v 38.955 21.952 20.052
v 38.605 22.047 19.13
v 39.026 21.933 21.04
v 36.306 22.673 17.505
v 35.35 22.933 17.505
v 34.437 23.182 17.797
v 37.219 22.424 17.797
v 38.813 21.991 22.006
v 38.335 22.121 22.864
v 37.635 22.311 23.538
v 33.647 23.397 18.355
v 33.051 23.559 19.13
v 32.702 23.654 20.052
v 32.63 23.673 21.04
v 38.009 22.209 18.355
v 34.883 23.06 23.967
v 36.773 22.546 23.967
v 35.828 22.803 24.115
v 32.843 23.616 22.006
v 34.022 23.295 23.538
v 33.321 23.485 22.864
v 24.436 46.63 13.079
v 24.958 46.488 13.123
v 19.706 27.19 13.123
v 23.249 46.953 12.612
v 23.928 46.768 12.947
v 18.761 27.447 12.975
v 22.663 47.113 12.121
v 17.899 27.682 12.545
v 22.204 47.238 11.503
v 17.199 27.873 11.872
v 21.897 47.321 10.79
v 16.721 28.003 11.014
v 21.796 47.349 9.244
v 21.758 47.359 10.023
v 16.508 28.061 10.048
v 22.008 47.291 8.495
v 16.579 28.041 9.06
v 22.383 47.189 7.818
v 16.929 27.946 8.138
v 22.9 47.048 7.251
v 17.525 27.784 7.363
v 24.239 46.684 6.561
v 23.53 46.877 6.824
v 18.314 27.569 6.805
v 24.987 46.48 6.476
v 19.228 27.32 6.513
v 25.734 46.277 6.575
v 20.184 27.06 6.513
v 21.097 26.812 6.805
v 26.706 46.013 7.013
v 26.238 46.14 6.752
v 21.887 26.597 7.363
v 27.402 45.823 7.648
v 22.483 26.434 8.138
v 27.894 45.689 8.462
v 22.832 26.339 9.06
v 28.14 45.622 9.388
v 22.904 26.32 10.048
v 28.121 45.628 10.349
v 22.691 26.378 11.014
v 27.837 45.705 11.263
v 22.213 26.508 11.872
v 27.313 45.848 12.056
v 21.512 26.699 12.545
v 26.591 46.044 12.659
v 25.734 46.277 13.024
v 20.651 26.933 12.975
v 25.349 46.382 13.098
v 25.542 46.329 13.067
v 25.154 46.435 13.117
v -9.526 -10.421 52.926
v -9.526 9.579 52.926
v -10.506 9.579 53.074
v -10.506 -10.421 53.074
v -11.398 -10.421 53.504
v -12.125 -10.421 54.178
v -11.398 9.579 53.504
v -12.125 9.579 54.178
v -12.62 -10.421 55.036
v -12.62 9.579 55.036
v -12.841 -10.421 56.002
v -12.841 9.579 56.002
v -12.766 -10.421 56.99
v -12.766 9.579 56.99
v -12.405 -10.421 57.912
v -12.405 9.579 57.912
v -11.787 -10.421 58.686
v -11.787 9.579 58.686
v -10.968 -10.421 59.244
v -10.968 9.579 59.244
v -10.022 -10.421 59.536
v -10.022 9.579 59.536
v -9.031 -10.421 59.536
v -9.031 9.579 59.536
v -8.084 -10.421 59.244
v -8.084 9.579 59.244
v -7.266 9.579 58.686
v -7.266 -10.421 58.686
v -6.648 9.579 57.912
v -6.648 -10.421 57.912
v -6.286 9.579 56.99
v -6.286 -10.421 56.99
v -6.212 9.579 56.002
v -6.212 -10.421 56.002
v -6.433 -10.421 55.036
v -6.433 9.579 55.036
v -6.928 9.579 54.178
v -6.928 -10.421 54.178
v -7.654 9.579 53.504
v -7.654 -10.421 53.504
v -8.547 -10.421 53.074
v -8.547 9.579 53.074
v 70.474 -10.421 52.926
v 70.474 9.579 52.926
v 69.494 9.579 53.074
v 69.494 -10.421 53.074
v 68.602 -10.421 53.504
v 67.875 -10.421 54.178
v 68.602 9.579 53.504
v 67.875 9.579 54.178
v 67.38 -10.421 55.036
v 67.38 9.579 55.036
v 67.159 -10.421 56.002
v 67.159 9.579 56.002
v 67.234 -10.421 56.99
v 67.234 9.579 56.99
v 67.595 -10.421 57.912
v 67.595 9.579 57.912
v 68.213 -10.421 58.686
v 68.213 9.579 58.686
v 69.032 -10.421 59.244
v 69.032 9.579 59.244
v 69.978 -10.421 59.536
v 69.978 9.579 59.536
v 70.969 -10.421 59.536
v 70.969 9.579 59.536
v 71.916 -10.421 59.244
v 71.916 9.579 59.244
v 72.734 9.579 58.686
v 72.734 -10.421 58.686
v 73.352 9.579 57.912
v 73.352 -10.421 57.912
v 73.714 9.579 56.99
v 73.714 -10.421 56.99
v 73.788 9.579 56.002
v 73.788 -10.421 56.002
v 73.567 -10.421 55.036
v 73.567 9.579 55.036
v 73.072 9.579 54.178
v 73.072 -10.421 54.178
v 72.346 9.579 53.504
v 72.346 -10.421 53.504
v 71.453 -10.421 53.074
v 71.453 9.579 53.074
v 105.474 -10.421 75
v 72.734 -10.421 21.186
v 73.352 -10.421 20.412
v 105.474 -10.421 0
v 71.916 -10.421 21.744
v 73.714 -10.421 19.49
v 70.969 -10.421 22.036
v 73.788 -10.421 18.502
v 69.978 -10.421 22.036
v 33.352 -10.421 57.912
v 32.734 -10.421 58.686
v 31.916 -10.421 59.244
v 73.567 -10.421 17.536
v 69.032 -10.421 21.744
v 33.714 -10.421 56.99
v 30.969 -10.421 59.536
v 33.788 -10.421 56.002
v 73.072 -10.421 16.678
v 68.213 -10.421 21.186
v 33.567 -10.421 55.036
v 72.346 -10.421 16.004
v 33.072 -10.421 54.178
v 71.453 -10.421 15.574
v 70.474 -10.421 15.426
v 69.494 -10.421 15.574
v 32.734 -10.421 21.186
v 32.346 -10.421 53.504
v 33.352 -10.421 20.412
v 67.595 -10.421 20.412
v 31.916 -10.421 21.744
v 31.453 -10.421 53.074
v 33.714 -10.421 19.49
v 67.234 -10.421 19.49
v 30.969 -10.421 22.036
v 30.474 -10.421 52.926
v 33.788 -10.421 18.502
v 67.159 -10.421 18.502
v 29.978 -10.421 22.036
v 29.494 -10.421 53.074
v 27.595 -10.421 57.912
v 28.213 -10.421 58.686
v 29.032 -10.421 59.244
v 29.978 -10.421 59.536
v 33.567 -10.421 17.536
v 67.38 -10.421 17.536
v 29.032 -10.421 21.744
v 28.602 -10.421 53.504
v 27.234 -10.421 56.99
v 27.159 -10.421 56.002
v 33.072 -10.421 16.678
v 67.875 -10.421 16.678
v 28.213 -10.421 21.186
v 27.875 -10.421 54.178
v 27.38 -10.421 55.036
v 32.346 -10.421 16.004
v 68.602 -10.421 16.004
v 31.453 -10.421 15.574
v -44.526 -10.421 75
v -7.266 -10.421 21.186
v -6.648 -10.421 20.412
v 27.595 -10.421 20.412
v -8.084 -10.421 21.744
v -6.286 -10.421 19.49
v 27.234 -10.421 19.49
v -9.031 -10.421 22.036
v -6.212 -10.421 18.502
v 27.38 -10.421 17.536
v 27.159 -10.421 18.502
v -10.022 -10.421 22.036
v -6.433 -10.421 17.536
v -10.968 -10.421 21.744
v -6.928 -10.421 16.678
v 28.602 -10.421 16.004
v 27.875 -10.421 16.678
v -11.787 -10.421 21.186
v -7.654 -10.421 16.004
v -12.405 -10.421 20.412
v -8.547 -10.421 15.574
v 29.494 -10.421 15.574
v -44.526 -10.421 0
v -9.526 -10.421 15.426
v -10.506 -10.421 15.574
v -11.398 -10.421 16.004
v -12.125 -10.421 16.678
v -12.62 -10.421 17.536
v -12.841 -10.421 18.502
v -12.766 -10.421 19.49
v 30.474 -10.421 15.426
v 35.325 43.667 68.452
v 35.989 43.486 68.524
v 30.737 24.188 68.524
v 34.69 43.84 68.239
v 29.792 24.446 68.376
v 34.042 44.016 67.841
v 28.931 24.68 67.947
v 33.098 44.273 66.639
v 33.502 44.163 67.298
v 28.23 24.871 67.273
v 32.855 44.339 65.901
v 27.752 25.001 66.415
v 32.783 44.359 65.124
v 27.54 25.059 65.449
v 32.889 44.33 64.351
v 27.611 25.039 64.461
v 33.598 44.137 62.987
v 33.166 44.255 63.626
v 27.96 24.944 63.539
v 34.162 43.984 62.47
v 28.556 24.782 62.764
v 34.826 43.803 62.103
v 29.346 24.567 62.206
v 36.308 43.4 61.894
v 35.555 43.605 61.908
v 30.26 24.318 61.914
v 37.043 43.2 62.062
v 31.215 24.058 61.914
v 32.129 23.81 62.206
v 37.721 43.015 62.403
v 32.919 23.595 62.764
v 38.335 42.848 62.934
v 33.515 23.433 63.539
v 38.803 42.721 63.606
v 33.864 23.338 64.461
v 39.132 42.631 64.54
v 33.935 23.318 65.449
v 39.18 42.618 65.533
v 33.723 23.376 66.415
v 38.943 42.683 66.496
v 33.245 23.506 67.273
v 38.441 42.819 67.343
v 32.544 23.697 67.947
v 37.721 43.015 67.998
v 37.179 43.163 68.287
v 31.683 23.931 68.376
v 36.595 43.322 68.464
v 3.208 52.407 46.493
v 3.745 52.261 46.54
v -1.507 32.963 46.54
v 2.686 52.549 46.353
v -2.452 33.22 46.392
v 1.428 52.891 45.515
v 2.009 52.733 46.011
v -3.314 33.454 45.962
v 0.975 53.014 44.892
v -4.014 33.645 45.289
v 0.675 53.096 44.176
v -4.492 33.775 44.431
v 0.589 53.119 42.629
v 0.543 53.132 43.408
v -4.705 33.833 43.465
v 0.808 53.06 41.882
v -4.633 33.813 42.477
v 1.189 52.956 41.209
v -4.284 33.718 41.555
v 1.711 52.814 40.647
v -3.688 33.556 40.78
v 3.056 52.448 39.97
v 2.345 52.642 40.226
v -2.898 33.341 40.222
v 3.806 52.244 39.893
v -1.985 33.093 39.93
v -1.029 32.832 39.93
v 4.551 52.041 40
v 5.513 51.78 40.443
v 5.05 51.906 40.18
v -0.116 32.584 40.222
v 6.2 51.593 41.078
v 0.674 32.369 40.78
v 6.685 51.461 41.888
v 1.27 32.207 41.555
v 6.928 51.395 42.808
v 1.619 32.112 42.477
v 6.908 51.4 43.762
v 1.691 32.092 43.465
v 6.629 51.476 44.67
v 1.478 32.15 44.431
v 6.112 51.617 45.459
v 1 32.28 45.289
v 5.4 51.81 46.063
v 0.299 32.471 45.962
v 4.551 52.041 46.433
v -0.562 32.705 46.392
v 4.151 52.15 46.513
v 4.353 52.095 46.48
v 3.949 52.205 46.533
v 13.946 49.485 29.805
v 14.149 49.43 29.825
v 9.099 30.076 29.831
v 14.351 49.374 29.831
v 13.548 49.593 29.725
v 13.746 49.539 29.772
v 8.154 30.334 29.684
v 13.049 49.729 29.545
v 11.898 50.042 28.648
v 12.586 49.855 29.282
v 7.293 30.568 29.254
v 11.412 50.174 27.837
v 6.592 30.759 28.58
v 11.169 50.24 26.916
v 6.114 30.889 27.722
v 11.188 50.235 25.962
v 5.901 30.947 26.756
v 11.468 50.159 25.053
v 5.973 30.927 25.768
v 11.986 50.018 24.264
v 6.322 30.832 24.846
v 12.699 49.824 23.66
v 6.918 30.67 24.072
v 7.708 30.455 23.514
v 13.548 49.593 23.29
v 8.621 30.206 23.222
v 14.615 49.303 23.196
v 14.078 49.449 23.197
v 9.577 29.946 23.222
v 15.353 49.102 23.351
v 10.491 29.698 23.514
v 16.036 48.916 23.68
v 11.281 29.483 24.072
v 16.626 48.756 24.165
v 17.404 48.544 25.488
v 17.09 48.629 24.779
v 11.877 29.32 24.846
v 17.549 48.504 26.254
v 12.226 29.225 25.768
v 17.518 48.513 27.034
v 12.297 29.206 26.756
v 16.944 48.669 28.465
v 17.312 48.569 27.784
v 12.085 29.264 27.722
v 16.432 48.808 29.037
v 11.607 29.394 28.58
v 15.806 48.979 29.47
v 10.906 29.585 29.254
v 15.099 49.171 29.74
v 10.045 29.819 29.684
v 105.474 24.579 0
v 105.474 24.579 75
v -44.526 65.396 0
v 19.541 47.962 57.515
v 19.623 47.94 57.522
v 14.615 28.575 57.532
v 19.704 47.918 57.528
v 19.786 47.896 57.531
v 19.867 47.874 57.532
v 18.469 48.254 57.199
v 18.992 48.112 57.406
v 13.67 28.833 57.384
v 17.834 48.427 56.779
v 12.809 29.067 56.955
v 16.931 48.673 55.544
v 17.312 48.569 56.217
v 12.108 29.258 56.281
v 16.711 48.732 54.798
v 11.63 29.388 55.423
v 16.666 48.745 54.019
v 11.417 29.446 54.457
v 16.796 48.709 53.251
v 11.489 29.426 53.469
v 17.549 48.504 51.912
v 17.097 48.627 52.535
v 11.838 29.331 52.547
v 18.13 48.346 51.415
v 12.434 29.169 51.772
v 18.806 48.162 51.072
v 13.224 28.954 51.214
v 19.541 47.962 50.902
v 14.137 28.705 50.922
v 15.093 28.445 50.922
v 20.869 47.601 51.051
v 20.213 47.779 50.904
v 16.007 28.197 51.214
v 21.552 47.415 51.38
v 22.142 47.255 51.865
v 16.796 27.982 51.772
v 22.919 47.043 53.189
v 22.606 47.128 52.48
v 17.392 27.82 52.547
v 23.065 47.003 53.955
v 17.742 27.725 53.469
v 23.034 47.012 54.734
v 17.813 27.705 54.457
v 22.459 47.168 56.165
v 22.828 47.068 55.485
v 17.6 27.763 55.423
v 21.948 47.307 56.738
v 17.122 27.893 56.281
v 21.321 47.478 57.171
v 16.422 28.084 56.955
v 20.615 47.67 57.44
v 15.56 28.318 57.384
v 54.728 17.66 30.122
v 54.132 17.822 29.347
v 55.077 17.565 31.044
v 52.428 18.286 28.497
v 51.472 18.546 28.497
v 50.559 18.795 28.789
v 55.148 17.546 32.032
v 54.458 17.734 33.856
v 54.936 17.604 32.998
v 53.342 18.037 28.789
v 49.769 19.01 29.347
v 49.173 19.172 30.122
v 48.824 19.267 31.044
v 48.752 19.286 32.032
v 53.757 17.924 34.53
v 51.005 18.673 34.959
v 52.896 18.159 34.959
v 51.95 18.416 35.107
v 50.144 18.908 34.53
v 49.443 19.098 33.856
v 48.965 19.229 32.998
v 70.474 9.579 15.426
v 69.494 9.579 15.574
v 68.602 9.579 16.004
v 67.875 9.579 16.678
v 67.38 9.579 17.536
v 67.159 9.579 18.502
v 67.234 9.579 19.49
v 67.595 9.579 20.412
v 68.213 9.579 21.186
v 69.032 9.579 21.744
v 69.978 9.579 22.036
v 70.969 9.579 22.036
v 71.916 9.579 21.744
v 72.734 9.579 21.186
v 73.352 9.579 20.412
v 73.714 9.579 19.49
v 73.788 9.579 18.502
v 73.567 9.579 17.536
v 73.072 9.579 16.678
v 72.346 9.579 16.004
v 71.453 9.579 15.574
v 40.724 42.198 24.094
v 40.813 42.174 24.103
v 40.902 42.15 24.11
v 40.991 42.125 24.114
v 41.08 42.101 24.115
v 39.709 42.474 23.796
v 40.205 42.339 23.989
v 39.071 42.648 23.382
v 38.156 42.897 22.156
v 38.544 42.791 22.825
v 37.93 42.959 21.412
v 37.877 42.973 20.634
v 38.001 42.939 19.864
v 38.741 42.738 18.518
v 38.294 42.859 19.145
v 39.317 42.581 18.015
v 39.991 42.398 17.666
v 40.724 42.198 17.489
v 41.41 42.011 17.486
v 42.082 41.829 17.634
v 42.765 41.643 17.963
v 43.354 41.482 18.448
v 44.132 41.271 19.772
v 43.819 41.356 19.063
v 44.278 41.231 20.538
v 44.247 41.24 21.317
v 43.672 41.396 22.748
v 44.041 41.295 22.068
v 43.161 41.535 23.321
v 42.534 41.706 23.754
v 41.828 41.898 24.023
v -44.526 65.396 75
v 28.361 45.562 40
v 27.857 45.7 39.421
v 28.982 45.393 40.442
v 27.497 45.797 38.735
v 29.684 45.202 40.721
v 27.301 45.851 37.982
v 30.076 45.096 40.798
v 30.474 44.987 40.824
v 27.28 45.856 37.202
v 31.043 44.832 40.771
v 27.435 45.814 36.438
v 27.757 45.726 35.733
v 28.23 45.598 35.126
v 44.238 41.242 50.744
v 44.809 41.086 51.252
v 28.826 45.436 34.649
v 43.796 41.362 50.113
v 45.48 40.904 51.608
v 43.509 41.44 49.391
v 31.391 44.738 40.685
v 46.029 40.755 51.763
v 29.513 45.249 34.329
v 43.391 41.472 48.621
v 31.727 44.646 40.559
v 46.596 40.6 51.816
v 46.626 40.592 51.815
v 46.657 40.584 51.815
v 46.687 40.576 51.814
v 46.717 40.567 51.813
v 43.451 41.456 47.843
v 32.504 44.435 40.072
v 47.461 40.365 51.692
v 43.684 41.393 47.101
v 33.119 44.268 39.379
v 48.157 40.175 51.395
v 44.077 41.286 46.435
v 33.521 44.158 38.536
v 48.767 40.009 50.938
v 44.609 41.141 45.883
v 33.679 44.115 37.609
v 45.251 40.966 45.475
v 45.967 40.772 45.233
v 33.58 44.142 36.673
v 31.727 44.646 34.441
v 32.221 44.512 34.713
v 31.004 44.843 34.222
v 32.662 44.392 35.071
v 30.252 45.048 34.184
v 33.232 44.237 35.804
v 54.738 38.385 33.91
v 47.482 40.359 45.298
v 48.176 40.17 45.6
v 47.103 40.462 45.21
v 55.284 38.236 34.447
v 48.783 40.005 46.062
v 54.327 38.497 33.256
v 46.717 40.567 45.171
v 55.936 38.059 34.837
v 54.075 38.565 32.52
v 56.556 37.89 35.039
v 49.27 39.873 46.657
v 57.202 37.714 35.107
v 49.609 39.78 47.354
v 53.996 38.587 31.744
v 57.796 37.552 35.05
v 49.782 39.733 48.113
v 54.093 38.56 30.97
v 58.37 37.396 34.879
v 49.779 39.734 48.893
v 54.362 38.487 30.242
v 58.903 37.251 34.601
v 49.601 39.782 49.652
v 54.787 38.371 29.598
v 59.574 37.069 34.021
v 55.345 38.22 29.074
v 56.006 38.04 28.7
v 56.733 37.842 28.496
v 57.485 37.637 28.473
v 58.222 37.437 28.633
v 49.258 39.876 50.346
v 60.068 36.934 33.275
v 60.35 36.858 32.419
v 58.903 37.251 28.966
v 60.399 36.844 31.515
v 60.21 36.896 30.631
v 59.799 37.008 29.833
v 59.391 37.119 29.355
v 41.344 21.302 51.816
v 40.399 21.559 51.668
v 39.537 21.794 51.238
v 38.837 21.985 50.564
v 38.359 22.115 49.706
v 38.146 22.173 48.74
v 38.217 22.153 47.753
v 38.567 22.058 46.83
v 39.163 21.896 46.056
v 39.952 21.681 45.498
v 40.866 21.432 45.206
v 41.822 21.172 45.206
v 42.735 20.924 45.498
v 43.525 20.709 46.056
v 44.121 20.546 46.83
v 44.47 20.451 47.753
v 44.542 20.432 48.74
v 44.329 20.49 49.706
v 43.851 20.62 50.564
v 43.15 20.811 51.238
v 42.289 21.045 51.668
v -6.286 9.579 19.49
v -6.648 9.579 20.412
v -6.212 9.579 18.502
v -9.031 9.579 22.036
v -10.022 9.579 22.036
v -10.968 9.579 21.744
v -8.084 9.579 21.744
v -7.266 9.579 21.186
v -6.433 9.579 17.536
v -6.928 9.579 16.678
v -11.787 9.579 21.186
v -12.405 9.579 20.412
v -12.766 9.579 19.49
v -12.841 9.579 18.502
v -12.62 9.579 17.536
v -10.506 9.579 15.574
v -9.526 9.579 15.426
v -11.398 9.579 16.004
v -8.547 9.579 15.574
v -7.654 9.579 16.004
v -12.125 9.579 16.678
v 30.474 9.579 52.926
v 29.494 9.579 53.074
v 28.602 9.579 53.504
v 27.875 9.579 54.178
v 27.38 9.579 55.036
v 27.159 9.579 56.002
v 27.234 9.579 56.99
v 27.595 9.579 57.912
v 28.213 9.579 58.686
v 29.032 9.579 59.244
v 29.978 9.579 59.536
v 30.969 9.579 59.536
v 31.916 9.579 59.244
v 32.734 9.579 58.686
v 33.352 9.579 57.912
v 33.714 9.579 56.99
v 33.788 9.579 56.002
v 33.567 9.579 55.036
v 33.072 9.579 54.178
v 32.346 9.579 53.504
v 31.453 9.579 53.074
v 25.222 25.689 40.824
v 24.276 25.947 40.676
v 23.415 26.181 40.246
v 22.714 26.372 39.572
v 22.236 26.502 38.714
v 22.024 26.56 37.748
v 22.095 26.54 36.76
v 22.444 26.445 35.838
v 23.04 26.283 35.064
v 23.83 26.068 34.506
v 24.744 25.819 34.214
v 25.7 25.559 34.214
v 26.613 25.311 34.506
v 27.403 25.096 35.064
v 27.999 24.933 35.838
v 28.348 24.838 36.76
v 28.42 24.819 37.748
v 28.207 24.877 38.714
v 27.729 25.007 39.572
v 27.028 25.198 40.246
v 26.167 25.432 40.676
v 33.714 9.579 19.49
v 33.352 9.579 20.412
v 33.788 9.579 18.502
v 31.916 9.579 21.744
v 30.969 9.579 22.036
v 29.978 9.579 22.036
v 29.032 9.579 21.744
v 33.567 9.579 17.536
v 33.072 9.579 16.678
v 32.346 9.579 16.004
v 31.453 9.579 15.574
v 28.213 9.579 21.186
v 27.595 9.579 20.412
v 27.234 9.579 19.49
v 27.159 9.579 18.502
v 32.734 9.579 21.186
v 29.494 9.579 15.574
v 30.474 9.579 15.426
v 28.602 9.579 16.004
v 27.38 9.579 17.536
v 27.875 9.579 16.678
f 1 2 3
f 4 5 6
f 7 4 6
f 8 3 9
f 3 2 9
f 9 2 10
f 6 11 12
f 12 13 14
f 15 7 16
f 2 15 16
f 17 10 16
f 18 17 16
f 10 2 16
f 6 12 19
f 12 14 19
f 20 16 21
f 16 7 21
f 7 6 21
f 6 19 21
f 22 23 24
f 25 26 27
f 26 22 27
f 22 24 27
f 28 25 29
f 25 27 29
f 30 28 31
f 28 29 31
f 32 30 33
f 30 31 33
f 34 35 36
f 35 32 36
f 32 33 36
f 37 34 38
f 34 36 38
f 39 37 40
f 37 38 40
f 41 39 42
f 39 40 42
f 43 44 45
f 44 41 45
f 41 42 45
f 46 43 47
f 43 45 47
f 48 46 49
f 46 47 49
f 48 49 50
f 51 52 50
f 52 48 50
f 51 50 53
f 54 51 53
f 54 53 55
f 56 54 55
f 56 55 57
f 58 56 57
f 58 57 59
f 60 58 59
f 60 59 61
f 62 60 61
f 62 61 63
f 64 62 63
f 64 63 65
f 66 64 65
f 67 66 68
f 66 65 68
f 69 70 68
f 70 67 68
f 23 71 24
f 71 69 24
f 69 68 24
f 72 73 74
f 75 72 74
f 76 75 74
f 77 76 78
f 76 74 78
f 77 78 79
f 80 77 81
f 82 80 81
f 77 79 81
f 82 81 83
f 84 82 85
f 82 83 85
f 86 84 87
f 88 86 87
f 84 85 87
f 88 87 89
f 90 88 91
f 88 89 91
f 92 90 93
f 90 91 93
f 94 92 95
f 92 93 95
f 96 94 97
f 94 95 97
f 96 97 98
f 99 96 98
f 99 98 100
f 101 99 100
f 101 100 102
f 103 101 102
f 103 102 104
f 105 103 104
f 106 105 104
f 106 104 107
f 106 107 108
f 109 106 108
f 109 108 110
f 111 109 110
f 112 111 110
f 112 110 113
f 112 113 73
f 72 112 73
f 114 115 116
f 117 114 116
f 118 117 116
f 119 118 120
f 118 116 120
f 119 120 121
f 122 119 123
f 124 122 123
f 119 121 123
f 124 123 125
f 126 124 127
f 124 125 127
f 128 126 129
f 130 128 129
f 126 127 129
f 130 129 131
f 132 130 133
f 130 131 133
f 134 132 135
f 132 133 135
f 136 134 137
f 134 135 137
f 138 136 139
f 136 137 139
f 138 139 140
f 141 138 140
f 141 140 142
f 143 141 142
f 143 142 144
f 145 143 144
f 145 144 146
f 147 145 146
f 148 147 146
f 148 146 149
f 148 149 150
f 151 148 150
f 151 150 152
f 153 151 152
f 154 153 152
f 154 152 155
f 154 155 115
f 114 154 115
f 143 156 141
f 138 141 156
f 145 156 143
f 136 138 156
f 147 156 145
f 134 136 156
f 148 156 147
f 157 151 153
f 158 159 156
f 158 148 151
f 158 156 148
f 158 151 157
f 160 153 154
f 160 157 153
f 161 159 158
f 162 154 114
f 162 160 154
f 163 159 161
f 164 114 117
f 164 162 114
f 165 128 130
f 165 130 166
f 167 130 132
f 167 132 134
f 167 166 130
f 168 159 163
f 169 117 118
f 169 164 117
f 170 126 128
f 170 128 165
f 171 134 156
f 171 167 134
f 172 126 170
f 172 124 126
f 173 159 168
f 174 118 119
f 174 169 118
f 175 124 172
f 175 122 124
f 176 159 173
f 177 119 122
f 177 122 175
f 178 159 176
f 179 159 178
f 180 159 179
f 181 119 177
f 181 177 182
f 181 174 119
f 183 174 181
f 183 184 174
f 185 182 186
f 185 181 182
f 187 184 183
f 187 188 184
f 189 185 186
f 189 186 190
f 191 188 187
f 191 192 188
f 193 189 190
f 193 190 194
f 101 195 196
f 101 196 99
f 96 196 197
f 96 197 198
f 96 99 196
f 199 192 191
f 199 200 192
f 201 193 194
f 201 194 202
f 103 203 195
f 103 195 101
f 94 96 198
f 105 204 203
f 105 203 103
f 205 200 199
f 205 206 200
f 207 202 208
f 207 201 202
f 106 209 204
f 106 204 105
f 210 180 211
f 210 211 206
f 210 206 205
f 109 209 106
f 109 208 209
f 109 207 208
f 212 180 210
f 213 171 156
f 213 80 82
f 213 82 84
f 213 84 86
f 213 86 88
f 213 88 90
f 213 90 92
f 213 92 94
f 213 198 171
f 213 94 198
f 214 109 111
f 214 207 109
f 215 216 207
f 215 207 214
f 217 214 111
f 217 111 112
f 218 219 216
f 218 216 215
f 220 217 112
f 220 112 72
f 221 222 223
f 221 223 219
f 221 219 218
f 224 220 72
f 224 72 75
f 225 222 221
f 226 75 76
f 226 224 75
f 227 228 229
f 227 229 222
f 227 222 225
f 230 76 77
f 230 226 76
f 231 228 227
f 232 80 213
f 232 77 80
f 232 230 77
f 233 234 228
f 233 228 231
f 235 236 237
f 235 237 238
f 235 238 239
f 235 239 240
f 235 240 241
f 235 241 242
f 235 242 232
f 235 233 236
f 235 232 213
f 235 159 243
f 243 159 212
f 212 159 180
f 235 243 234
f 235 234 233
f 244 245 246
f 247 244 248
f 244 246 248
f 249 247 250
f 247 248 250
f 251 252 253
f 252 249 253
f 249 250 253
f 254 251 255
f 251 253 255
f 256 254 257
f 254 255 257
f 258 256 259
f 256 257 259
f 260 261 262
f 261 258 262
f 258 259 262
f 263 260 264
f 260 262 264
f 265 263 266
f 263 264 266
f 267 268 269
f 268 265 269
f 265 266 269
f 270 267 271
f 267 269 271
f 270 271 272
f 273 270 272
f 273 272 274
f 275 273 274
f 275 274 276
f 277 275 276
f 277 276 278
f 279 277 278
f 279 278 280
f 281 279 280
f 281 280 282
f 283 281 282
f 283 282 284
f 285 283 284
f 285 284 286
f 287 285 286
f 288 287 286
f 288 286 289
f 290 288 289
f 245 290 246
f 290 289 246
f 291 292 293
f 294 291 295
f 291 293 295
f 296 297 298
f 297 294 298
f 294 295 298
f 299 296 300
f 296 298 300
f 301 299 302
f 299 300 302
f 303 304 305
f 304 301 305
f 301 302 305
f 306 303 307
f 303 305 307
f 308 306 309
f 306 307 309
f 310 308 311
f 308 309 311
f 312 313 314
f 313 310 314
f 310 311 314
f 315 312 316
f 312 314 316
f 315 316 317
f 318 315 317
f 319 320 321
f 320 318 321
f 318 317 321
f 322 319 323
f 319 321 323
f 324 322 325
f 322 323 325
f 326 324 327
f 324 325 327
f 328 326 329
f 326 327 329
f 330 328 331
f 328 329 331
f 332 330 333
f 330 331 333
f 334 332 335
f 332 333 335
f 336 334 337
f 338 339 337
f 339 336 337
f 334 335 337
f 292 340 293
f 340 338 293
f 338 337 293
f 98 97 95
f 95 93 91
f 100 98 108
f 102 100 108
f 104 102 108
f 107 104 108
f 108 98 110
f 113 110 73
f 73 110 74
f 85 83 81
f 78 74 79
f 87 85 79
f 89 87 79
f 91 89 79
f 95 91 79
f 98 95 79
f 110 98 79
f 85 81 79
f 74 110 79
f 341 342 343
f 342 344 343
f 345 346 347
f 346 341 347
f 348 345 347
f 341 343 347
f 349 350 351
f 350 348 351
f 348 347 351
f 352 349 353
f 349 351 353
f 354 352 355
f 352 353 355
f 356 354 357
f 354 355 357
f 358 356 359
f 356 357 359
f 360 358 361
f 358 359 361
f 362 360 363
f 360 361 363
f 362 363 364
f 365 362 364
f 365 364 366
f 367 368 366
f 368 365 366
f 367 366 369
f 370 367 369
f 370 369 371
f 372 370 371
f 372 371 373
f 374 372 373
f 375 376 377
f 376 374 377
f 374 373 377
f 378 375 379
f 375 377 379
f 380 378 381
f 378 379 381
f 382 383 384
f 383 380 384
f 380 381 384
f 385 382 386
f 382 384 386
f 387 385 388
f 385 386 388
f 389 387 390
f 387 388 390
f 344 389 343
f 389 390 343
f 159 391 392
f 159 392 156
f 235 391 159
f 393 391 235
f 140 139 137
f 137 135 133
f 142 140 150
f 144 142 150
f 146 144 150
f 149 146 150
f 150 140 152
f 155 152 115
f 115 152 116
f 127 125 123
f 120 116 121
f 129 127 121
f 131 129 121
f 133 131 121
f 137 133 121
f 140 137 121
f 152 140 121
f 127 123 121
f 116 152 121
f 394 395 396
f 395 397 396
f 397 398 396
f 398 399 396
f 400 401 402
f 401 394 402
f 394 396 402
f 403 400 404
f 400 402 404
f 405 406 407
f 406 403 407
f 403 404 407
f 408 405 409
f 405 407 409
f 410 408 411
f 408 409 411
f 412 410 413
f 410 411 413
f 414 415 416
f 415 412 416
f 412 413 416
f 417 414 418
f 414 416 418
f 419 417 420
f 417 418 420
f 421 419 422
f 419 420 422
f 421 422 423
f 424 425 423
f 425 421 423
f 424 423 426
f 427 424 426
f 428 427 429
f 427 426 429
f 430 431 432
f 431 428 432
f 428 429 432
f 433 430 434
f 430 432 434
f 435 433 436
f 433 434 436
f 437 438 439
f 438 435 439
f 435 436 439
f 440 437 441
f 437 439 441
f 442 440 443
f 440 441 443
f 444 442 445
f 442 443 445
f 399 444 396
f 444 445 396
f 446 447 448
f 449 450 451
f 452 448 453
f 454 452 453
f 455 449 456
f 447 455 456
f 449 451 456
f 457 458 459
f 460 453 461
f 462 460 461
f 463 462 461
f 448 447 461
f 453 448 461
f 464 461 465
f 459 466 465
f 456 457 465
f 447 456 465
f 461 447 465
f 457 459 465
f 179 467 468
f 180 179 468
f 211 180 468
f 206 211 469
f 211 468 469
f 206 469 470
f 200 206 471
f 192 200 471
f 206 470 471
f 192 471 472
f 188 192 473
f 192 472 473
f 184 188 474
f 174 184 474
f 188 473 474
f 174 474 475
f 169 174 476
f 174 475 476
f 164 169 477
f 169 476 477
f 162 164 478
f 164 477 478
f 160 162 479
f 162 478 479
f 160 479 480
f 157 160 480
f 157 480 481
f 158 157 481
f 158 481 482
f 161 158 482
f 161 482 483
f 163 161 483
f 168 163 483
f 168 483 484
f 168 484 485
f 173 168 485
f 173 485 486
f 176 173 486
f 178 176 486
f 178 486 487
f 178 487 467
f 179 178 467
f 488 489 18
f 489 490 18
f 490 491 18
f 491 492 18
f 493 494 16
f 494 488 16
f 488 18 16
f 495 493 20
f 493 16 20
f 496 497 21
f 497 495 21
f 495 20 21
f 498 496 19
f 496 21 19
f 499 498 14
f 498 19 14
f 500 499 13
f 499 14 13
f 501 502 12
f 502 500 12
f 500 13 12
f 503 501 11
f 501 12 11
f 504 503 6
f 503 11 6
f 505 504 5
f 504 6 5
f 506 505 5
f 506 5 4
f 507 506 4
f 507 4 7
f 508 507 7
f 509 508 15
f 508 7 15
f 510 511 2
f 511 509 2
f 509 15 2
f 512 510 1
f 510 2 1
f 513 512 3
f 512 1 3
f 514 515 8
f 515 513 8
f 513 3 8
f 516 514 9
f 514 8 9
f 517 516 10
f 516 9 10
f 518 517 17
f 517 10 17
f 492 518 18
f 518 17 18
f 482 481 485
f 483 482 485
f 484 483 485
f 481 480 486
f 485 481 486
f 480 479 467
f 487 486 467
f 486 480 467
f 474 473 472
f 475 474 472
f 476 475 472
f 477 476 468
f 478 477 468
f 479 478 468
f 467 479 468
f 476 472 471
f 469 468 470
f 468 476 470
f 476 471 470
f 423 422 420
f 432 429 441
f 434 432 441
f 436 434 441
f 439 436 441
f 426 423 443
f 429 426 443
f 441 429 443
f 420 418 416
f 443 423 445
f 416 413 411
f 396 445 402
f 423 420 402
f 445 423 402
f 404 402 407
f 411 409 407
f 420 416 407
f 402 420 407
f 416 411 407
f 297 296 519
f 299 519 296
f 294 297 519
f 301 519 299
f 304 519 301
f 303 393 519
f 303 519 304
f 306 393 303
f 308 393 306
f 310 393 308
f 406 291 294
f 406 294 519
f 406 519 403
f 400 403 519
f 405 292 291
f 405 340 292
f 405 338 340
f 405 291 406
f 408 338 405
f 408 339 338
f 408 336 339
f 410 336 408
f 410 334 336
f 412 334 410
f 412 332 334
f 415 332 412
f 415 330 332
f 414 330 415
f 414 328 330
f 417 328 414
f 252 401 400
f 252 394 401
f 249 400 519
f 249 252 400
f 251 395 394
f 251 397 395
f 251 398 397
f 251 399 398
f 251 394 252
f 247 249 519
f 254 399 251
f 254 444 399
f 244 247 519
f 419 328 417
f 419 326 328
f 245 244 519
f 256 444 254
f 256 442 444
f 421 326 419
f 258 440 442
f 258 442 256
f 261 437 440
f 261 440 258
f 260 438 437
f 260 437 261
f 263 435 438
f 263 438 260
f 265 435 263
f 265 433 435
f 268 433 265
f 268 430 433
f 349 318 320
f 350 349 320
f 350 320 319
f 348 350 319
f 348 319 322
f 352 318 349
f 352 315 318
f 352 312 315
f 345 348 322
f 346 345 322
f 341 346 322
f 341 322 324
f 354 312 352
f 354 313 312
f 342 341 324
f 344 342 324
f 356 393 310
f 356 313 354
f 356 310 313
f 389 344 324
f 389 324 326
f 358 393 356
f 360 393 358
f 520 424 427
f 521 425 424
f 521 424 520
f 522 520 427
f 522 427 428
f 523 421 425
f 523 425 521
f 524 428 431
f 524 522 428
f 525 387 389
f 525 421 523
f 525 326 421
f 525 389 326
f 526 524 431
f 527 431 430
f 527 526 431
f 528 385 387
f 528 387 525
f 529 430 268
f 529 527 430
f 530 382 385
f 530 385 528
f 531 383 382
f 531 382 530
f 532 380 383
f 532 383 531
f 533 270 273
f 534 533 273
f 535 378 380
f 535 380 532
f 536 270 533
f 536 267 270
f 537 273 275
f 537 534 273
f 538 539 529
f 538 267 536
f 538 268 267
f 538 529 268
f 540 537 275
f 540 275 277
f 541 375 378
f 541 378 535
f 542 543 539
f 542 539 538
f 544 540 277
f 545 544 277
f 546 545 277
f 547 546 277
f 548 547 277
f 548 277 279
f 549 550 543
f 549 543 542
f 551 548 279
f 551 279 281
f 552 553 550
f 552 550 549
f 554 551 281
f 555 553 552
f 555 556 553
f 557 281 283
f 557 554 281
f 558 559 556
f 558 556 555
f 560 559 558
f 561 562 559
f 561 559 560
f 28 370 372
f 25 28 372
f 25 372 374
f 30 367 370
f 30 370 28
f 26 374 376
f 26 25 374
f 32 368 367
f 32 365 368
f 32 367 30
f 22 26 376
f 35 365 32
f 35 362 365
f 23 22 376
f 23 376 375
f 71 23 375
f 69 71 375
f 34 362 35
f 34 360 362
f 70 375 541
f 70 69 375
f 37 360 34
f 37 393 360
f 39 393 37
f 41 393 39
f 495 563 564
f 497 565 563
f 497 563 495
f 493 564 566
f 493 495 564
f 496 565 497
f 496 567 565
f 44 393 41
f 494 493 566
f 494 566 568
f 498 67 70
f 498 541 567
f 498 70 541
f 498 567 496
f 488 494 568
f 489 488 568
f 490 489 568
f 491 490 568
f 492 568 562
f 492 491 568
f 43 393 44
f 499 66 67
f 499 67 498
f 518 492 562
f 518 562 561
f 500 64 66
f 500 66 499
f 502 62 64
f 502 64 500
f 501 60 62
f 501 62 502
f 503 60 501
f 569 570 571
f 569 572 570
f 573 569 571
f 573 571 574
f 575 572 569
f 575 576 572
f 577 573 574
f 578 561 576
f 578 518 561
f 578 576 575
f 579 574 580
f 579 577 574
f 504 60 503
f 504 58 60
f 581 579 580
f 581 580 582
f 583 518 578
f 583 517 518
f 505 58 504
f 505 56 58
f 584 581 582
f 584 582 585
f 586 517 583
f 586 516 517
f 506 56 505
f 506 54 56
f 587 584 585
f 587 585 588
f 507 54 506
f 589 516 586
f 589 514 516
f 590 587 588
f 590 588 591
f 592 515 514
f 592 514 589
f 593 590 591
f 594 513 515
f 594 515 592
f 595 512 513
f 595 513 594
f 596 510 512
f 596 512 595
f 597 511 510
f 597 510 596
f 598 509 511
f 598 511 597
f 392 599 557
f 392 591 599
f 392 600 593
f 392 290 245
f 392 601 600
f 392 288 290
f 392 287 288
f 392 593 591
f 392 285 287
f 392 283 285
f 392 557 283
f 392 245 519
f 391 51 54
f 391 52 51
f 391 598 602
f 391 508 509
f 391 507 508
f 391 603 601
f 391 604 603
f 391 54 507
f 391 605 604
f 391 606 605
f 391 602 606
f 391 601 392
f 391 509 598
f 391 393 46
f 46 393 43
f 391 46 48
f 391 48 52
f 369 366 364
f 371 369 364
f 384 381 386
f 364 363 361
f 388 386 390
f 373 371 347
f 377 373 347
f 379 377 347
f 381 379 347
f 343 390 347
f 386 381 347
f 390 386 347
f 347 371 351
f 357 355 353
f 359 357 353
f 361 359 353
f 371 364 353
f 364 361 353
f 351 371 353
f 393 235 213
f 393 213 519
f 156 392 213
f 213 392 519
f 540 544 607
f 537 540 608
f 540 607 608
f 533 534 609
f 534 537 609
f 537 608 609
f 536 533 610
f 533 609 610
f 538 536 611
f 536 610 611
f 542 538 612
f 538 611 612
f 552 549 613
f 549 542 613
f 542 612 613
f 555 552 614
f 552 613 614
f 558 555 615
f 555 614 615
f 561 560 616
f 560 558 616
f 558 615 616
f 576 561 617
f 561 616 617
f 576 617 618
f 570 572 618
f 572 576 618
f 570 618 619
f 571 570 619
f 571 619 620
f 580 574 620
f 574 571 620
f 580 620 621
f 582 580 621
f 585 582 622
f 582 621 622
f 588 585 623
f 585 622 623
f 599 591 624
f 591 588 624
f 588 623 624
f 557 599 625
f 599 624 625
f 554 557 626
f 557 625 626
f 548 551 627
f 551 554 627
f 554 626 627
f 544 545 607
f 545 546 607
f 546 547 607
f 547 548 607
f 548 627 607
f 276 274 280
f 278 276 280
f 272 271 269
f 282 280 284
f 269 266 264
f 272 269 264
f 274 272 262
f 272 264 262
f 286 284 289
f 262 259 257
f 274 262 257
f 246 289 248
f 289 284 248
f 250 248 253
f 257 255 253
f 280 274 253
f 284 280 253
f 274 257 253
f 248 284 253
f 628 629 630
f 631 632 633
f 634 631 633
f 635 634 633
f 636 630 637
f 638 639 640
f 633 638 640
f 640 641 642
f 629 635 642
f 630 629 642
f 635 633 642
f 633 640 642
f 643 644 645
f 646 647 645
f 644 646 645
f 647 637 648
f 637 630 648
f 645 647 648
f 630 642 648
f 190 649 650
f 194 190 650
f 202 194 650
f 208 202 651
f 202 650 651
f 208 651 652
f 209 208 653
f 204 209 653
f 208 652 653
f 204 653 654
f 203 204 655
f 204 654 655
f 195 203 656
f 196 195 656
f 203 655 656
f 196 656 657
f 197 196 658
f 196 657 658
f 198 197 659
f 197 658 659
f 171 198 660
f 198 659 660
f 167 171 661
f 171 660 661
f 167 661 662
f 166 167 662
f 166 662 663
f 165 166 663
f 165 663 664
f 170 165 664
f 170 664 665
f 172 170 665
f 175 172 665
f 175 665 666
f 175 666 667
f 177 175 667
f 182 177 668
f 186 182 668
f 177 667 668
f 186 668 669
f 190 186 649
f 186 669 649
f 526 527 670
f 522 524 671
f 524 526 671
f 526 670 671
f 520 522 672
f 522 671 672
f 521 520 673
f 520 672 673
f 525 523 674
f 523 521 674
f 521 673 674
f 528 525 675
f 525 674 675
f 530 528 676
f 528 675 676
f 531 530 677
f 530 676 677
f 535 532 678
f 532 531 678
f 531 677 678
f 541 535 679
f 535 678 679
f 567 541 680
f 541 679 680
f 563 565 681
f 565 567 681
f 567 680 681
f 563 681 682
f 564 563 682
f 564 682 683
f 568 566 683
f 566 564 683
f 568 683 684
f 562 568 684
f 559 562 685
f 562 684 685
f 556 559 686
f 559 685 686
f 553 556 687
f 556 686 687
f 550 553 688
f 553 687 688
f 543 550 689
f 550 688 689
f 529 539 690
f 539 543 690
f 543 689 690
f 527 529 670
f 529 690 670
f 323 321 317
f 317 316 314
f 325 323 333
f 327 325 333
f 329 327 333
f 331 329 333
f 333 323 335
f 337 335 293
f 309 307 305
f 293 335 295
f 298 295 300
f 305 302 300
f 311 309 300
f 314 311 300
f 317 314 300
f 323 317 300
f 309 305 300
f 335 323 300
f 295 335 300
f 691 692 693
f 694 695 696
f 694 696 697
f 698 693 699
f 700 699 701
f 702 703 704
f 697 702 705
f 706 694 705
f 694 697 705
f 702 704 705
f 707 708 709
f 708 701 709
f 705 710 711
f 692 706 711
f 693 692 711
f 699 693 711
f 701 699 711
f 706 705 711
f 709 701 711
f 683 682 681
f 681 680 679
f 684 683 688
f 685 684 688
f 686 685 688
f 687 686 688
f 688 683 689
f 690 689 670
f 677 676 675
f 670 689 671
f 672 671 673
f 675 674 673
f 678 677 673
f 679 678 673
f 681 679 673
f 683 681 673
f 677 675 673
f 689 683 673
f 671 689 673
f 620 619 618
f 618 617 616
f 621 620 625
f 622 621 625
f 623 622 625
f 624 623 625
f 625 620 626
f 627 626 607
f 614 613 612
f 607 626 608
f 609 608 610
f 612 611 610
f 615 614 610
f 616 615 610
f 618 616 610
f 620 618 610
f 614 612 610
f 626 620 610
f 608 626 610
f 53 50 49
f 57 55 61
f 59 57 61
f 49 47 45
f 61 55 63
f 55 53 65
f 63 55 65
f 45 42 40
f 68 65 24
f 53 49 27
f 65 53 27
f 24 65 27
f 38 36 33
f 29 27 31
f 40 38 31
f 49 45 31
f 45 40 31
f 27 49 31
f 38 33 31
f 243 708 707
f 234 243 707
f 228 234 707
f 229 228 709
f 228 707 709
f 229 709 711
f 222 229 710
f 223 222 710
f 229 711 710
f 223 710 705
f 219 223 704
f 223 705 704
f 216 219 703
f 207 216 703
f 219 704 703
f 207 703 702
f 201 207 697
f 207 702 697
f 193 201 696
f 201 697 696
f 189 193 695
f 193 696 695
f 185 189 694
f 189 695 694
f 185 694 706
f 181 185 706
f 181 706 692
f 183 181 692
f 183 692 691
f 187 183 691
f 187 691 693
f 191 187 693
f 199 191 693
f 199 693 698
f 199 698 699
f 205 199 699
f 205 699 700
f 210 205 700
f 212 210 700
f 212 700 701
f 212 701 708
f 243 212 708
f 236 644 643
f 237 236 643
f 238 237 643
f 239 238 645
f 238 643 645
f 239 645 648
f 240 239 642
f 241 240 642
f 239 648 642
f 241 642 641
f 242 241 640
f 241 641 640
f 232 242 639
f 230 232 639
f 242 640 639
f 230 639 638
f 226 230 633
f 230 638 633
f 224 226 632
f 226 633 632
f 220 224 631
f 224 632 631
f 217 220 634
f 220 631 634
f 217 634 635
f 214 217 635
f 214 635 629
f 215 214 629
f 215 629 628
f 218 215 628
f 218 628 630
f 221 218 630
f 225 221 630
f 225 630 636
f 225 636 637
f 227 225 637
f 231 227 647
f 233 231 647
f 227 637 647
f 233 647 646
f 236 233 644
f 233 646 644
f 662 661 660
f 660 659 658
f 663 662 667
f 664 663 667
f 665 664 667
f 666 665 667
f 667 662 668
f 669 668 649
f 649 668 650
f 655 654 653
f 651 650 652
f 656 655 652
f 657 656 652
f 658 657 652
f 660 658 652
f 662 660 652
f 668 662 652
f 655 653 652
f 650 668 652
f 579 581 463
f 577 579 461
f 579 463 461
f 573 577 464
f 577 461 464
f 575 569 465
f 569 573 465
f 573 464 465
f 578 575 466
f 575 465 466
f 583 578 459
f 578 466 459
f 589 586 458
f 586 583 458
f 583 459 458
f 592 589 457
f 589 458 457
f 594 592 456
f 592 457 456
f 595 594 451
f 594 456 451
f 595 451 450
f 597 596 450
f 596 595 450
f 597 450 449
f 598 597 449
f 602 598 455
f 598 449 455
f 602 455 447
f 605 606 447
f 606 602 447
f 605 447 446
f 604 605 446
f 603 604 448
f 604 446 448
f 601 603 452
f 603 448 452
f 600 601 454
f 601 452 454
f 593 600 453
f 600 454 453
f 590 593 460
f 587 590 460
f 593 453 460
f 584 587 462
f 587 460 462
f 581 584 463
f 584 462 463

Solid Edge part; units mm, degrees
sketch "Sketch1" plane through (0, 0, 0) normal (0, 0, 1) x (1, 0, 0)
  line L0 (-44.5263, -10.4211) -> (-44.5263, 65.3958)
  line L1 (-44.5263, 65.3958) -> (105.4737, 24.5789)
  line L2 (105.4737, 24.5789) -> (105.4737, -10.4211)
  line L3 (105.4737, -10.4211) -> (-44.5263, -10.4211)
  dimension "D1" = 150
  dimension "D2" = 35
extrude "Protrusion1" add sketch "Sketch1" along normal blind 75
hole "Hole_1" at (70.4737, -10.4211, 56.25) direction (0, 1, 0) diameter 6.647 depth 20
hole "Hole1" at (30.4737, -10.4211, 56.25) direction (0, 1, 0) diameter 6.647 depth 20
hole "Hole2" at (-9.5263, -10.4211, 18.75) direction (0, 1, 0) diameter 6.647 depth 20
hole "Hole3" at (30.4737, -10.4211, 18.75) direction (0, 1, 0) diameter 6.647 depth 20
hole "Hole4" at (70.4737, -10.4211, 18.75) direction (0, 1, 0) diameter 6.647 depth 20
hole "Hole5" at (-9.5263, -10.4211, 56.25) direction (0, 1, 0) diameter 6.647 depth 20
hole "Hole_14" at (3.745, 52.2606, 43.2164) direction (-0.2626, -0.9649, 0) diameter 6.647 depth 20
hole "Hole6" at (24.9579, 46.4883, 9.7994) direction (-0.2626, -0.9649, 0) diameter 6.647 depth 20
hole "Hole7" at (57.2024, 37.7142, 31.7836) direction (-0.2626, -0.9649, 0) diameter 6.647 depth 20
hole "Hole8" at (35.9895, 43.4865, 65.2006) direction (-0.2626, -0.9649, 0) diameter 6.647 depth 20
hole "Hole9" at (14.3514, 49.3744, 26.5079) direction (-0.2626, -0.9649, 0) diameter 6.647 depth 20
hole "Hole10" at (46.5959, 40.6003, 48.4921) direction (-0.2626, -0.9649, 0) diameter 6.647 depth 20
hole "Hole11" at (19.8672, 47.8735, 54.2085) direction (-0.2626, -0.9649, 0) diameter 6.647 depth 20
hole "Hole12" at (41.0801, 42.1012, 20.7915) direction (-0.2626, -0.9649, 0) diameter 6.647 depth 20
hole "Hole13" at (30.4737, 44.9874, 37.5) direction (-0.2626, -0.9649, 0) diameter 6.647 depth 20
